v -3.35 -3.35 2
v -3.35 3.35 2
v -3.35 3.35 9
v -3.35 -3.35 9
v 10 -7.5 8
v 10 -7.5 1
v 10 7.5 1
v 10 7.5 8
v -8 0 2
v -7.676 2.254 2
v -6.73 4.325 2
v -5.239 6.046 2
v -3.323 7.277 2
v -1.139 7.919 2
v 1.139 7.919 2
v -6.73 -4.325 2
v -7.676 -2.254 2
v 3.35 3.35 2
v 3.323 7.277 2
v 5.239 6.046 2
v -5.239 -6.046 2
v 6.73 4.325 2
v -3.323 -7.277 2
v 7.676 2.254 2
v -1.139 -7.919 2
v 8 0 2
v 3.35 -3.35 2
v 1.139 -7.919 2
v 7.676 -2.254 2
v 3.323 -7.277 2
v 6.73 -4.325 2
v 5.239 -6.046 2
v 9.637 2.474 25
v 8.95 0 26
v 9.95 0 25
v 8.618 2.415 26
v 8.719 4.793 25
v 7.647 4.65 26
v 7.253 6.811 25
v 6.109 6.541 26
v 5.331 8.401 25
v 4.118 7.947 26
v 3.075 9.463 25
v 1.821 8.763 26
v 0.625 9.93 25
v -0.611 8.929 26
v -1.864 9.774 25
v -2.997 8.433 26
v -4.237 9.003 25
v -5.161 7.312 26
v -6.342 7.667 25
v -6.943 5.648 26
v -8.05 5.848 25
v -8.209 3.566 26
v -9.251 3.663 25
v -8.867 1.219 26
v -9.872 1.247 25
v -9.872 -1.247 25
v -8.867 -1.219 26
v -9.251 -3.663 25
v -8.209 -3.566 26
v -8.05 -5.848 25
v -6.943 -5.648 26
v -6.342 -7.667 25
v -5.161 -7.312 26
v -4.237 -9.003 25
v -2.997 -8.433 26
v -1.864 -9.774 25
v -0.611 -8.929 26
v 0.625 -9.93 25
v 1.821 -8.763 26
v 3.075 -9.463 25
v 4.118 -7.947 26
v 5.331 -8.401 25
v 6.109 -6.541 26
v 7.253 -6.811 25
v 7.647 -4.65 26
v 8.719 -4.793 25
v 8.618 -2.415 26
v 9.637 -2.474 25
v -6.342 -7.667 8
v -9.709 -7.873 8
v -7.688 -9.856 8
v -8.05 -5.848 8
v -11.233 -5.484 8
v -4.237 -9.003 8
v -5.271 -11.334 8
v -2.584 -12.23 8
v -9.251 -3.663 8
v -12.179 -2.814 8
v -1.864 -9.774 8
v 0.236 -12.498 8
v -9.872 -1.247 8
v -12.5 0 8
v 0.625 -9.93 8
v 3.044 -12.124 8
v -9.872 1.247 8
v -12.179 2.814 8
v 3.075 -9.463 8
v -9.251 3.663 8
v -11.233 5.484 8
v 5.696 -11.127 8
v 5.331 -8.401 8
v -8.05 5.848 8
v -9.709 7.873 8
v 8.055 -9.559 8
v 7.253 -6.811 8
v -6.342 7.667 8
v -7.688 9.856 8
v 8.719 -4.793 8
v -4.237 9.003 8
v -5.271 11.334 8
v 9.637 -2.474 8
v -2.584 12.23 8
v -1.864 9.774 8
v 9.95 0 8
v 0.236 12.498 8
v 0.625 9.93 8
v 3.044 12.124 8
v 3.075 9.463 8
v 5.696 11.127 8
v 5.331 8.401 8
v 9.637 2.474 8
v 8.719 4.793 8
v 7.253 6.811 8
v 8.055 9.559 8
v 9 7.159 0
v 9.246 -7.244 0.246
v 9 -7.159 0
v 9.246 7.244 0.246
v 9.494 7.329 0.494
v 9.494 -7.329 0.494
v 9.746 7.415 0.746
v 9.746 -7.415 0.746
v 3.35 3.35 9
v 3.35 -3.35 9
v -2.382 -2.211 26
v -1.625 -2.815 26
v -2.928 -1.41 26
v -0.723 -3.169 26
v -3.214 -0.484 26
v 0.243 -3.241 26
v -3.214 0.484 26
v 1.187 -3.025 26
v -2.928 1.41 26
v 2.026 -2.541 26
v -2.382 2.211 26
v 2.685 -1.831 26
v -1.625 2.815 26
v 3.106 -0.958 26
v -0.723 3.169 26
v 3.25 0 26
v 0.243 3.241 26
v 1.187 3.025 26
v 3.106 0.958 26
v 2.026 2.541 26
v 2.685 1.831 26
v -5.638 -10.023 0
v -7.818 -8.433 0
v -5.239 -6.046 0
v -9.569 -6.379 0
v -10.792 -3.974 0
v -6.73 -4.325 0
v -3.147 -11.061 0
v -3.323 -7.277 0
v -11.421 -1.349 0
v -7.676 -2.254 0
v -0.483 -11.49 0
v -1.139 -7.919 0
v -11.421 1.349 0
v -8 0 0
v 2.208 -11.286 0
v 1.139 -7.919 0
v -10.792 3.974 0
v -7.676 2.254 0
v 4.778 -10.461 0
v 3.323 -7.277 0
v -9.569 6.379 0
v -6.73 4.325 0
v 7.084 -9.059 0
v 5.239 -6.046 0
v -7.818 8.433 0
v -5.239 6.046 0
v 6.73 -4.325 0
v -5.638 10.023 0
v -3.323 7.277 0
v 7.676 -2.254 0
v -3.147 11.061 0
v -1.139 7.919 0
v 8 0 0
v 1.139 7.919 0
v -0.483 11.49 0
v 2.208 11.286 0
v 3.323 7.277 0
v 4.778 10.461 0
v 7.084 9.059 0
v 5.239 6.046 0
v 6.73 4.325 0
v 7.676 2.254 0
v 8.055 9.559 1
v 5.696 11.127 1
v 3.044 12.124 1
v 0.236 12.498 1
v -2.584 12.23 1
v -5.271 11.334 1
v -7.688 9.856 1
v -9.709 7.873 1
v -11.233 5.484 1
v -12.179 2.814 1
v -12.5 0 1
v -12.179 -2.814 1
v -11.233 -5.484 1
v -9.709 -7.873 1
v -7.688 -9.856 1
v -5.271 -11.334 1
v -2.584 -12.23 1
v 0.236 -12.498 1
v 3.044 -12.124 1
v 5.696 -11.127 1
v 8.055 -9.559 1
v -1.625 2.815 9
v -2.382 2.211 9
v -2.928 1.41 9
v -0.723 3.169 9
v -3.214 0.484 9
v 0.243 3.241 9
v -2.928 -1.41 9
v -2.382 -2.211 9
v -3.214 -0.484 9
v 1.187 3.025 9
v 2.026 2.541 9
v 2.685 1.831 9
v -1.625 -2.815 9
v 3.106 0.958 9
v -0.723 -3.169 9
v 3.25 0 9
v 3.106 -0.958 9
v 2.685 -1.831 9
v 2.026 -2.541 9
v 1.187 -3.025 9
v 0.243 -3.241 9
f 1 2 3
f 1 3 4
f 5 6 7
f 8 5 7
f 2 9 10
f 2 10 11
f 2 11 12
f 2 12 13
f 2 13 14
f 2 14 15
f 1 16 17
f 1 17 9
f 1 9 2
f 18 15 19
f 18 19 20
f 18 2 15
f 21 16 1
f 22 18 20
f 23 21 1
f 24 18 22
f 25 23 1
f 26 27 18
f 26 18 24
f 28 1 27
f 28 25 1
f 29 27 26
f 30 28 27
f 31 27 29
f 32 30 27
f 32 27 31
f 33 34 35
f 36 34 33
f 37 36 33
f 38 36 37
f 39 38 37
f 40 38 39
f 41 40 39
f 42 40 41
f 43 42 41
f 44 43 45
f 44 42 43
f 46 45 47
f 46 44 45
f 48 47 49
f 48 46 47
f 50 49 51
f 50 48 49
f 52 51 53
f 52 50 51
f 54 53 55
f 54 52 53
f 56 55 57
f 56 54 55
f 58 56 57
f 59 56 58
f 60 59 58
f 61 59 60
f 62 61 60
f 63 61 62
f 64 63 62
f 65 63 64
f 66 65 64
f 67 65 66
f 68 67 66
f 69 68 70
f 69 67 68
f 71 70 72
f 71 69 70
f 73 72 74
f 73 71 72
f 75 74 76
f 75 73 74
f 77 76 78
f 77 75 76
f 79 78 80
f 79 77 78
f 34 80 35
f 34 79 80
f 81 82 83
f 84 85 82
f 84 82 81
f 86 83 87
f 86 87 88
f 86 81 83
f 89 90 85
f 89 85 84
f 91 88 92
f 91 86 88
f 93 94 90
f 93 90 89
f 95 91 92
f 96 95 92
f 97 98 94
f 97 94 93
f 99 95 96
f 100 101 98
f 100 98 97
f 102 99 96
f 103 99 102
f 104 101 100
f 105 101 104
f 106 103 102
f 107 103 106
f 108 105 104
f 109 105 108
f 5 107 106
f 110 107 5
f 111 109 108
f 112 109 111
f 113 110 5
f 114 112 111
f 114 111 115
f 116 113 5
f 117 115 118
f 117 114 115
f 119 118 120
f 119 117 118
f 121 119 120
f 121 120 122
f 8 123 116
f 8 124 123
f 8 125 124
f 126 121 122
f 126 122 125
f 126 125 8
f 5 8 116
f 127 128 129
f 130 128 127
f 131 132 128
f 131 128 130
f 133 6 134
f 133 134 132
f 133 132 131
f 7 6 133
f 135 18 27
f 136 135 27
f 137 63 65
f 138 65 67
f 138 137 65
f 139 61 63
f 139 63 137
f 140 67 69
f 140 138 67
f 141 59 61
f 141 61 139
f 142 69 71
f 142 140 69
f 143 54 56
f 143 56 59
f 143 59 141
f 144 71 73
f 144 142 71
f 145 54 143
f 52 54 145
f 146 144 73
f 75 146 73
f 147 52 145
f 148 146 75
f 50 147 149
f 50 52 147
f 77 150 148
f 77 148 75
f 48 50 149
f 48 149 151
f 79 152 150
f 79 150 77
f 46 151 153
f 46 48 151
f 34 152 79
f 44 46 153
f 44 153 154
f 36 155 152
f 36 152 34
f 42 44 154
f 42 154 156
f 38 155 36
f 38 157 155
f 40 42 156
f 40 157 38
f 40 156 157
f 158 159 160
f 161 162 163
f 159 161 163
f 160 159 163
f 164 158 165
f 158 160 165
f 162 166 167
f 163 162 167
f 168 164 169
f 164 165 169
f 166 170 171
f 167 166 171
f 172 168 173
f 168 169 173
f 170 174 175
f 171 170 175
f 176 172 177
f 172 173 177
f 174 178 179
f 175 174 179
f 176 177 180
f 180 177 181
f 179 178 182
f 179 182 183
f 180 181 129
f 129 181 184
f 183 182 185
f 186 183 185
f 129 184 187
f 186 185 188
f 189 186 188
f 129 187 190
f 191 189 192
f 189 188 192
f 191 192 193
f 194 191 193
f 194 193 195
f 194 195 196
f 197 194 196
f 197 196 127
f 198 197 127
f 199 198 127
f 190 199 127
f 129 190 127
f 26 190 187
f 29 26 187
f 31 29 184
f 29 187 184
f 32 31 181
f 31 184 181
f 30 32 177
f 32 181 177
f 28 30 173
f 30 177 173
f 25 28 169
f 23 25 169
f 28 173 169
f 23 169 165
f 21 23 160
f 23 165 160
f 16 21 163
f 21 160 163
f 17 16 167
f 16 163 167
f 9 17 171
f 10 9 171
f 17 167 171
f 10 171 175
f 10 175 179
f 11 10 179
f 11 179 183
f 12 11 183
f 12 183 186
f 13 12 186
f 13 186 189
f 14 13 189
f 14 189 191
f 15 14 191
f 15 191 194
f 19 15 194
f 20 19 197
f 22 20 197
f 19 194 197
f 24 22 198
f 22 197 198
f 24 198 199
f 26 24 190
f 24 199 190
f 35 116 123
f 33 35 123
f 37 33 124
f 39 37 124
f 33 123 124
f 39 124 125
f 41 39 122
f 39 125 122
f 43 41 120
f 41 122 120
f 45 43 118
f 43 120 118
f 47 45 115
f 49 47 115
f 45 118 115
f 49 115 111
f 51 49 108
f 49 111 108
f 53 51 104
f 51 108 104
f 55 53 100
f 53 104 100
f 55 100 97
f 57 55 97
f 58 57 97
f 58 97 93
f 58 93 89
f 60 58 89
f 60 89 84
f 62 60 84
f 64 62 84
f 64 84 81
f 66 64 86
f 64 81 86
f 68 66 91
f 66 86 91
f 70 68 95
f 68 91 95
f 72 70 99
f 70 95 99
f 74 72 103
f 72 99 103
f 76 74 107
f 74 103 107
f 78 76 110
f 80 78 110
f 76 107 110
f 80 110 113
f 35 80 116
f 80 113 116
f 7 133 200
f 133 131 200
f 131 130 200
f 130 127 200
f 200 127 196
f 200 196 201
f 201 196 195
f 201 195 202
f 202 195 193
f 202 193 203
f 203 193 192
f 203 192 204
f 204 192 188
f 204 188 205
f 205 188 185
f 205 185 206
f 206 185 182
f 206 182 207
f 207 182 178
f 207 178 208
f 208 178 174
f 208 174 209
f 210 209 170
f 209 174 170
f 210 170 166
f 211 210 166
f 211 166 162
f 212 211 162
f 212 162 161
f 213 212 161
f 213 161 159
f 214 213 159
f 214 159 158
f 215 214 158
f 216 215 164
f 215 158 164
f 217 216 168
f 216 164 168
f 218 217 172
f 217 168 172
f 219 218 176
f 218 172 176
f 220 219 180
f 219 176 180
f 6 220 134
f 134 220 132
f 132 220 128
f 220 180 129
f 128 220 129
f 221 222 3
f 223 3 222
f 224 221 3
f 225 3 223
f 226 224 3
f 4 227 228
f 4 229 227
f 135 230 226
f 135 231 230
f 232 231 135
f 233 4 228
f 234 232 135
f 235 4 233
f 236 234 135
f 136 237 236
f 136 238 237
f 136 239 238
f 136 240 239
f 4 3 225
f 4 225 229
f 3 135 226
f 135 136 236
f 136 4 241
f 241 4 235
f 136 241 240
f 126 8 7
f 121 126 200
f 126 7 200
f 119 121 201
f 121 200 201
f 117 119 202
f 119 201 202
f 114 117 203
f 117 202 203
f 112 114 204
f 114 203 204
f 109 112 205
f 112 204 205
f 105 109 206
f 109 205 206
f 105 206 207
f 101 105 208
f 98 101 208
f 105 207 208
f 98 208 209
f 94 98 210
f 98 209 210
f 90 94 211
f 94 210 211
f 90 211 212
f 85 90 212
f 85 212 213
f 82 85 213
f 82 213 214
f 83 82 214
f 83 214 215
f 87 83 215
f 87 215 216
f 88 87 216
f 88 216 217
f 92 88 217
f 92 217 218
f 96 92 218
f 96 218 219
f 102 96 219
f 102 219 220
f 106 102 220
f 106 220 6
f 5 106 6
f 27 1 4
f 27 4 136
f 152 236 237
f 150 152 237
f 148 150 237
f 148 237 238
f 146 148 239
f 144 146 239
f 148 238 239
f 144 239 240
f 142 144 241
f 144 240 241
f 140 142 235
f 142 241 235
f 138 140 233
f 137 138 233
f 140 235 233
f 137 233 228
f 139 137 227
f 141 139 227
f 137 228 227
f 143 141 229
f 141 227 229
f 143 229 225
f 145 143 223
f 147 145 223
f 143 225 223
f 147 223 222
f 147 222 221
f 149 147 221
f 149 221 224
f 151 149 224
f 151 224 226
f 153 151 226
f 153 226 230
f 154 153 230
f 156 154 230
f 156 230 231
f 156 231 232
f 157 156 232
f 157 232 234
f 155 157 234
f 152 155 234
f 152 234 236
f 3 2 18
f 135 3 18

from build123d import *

# Parameters (mm, degrees)
SKETCH_R        = 12.5
PAD_DEPTH       = 8
SKETCH001_R     = 9.95
PAD001_DEPTH    = 18
SKETCH002_R     = 3.25
POCKET_DEPTH    = 26.001
SKETCH003_W     = 6.7
SKETCH003_H     = 6.7
POCKET001_DEPTH = 9
SKETCH004_R     = 8
POCKET002_DEPTH = 2
CHAMFER_SIZE    = 1
CHAMFER001_SIZE = 1


with BuildPart() as part:
    # Sketch → Pad (new body)
    with BuildSketch(Plane.XY):
        Circle(SKETCH_R)
    extrude(amount=PAD_DEPTH)

    # Sketch001 (on Face3 of Pad) → Pad001 (join)
    with BuildSketch(Plane.XY.offset(8)):
        Circle(SKETCH001_R)
    extrude(amount=PAD001_DEPTH)

    # Sketch002 (on Face2 of Pad001) → Pocket (cut, through all)
    with BuildSketch(Plane(origin=(0, 0, 0), x_dir=(1, 0, 0), z_dir=(0, 0, -1))):
        Circle(SKETCH002_R)
        with BuildLine():
            Line((10, 7.5), (10, -7.5))
            ThreePointArc((10, -7.5), (12.5, 0), (10, 7.5))
        make_face()
    extrude(amount=-POCKET_DEPTH, mode=Mode.SUBTRACT)

    # Sketch003 (on Face2 of Pocket) → Pocket001 (cut)
    with BuildSketch(Plane(origin=(0, 0, 0), x_dir=(1, 0, 0), z_dir=(0, 0, -1))):
        Rectangle(SKETCH003_W, SKETCH003_H)
    extrude(amount=-POCKET001_DEPTH, mode=Mode.SUBTRACT)

    # Sketch004 → Pocket002 (cut)
    with BuildSketch(Plane(origin=(0, 0, 0), x_dir=(1, 0, 0), z_dir=(0, 0, -1))):
        Circle(SKETCH004_R)
    extrude(amount=-POCKET002_DEPTH, mode=Mode.SUBTRACT)

    # Chamfer
    chamfer_edges = [part.edges().sort_by_distance(p)[0] for p in [
        (-12.5, 0, 0),
        (10, 0, 0),
    ]]
    chamfer(chamfer_edges, length=CHAMFER_SIZE)

    # Chamfer001
    chamfer001_edges = [part.edges().sort_by_distance(p)[0] for p in [
        (-9.95, 0, 26),
    ]]
    chamfer(chamfer001_edges, length=CHAMFER001_SIZE)


solid = part.part
